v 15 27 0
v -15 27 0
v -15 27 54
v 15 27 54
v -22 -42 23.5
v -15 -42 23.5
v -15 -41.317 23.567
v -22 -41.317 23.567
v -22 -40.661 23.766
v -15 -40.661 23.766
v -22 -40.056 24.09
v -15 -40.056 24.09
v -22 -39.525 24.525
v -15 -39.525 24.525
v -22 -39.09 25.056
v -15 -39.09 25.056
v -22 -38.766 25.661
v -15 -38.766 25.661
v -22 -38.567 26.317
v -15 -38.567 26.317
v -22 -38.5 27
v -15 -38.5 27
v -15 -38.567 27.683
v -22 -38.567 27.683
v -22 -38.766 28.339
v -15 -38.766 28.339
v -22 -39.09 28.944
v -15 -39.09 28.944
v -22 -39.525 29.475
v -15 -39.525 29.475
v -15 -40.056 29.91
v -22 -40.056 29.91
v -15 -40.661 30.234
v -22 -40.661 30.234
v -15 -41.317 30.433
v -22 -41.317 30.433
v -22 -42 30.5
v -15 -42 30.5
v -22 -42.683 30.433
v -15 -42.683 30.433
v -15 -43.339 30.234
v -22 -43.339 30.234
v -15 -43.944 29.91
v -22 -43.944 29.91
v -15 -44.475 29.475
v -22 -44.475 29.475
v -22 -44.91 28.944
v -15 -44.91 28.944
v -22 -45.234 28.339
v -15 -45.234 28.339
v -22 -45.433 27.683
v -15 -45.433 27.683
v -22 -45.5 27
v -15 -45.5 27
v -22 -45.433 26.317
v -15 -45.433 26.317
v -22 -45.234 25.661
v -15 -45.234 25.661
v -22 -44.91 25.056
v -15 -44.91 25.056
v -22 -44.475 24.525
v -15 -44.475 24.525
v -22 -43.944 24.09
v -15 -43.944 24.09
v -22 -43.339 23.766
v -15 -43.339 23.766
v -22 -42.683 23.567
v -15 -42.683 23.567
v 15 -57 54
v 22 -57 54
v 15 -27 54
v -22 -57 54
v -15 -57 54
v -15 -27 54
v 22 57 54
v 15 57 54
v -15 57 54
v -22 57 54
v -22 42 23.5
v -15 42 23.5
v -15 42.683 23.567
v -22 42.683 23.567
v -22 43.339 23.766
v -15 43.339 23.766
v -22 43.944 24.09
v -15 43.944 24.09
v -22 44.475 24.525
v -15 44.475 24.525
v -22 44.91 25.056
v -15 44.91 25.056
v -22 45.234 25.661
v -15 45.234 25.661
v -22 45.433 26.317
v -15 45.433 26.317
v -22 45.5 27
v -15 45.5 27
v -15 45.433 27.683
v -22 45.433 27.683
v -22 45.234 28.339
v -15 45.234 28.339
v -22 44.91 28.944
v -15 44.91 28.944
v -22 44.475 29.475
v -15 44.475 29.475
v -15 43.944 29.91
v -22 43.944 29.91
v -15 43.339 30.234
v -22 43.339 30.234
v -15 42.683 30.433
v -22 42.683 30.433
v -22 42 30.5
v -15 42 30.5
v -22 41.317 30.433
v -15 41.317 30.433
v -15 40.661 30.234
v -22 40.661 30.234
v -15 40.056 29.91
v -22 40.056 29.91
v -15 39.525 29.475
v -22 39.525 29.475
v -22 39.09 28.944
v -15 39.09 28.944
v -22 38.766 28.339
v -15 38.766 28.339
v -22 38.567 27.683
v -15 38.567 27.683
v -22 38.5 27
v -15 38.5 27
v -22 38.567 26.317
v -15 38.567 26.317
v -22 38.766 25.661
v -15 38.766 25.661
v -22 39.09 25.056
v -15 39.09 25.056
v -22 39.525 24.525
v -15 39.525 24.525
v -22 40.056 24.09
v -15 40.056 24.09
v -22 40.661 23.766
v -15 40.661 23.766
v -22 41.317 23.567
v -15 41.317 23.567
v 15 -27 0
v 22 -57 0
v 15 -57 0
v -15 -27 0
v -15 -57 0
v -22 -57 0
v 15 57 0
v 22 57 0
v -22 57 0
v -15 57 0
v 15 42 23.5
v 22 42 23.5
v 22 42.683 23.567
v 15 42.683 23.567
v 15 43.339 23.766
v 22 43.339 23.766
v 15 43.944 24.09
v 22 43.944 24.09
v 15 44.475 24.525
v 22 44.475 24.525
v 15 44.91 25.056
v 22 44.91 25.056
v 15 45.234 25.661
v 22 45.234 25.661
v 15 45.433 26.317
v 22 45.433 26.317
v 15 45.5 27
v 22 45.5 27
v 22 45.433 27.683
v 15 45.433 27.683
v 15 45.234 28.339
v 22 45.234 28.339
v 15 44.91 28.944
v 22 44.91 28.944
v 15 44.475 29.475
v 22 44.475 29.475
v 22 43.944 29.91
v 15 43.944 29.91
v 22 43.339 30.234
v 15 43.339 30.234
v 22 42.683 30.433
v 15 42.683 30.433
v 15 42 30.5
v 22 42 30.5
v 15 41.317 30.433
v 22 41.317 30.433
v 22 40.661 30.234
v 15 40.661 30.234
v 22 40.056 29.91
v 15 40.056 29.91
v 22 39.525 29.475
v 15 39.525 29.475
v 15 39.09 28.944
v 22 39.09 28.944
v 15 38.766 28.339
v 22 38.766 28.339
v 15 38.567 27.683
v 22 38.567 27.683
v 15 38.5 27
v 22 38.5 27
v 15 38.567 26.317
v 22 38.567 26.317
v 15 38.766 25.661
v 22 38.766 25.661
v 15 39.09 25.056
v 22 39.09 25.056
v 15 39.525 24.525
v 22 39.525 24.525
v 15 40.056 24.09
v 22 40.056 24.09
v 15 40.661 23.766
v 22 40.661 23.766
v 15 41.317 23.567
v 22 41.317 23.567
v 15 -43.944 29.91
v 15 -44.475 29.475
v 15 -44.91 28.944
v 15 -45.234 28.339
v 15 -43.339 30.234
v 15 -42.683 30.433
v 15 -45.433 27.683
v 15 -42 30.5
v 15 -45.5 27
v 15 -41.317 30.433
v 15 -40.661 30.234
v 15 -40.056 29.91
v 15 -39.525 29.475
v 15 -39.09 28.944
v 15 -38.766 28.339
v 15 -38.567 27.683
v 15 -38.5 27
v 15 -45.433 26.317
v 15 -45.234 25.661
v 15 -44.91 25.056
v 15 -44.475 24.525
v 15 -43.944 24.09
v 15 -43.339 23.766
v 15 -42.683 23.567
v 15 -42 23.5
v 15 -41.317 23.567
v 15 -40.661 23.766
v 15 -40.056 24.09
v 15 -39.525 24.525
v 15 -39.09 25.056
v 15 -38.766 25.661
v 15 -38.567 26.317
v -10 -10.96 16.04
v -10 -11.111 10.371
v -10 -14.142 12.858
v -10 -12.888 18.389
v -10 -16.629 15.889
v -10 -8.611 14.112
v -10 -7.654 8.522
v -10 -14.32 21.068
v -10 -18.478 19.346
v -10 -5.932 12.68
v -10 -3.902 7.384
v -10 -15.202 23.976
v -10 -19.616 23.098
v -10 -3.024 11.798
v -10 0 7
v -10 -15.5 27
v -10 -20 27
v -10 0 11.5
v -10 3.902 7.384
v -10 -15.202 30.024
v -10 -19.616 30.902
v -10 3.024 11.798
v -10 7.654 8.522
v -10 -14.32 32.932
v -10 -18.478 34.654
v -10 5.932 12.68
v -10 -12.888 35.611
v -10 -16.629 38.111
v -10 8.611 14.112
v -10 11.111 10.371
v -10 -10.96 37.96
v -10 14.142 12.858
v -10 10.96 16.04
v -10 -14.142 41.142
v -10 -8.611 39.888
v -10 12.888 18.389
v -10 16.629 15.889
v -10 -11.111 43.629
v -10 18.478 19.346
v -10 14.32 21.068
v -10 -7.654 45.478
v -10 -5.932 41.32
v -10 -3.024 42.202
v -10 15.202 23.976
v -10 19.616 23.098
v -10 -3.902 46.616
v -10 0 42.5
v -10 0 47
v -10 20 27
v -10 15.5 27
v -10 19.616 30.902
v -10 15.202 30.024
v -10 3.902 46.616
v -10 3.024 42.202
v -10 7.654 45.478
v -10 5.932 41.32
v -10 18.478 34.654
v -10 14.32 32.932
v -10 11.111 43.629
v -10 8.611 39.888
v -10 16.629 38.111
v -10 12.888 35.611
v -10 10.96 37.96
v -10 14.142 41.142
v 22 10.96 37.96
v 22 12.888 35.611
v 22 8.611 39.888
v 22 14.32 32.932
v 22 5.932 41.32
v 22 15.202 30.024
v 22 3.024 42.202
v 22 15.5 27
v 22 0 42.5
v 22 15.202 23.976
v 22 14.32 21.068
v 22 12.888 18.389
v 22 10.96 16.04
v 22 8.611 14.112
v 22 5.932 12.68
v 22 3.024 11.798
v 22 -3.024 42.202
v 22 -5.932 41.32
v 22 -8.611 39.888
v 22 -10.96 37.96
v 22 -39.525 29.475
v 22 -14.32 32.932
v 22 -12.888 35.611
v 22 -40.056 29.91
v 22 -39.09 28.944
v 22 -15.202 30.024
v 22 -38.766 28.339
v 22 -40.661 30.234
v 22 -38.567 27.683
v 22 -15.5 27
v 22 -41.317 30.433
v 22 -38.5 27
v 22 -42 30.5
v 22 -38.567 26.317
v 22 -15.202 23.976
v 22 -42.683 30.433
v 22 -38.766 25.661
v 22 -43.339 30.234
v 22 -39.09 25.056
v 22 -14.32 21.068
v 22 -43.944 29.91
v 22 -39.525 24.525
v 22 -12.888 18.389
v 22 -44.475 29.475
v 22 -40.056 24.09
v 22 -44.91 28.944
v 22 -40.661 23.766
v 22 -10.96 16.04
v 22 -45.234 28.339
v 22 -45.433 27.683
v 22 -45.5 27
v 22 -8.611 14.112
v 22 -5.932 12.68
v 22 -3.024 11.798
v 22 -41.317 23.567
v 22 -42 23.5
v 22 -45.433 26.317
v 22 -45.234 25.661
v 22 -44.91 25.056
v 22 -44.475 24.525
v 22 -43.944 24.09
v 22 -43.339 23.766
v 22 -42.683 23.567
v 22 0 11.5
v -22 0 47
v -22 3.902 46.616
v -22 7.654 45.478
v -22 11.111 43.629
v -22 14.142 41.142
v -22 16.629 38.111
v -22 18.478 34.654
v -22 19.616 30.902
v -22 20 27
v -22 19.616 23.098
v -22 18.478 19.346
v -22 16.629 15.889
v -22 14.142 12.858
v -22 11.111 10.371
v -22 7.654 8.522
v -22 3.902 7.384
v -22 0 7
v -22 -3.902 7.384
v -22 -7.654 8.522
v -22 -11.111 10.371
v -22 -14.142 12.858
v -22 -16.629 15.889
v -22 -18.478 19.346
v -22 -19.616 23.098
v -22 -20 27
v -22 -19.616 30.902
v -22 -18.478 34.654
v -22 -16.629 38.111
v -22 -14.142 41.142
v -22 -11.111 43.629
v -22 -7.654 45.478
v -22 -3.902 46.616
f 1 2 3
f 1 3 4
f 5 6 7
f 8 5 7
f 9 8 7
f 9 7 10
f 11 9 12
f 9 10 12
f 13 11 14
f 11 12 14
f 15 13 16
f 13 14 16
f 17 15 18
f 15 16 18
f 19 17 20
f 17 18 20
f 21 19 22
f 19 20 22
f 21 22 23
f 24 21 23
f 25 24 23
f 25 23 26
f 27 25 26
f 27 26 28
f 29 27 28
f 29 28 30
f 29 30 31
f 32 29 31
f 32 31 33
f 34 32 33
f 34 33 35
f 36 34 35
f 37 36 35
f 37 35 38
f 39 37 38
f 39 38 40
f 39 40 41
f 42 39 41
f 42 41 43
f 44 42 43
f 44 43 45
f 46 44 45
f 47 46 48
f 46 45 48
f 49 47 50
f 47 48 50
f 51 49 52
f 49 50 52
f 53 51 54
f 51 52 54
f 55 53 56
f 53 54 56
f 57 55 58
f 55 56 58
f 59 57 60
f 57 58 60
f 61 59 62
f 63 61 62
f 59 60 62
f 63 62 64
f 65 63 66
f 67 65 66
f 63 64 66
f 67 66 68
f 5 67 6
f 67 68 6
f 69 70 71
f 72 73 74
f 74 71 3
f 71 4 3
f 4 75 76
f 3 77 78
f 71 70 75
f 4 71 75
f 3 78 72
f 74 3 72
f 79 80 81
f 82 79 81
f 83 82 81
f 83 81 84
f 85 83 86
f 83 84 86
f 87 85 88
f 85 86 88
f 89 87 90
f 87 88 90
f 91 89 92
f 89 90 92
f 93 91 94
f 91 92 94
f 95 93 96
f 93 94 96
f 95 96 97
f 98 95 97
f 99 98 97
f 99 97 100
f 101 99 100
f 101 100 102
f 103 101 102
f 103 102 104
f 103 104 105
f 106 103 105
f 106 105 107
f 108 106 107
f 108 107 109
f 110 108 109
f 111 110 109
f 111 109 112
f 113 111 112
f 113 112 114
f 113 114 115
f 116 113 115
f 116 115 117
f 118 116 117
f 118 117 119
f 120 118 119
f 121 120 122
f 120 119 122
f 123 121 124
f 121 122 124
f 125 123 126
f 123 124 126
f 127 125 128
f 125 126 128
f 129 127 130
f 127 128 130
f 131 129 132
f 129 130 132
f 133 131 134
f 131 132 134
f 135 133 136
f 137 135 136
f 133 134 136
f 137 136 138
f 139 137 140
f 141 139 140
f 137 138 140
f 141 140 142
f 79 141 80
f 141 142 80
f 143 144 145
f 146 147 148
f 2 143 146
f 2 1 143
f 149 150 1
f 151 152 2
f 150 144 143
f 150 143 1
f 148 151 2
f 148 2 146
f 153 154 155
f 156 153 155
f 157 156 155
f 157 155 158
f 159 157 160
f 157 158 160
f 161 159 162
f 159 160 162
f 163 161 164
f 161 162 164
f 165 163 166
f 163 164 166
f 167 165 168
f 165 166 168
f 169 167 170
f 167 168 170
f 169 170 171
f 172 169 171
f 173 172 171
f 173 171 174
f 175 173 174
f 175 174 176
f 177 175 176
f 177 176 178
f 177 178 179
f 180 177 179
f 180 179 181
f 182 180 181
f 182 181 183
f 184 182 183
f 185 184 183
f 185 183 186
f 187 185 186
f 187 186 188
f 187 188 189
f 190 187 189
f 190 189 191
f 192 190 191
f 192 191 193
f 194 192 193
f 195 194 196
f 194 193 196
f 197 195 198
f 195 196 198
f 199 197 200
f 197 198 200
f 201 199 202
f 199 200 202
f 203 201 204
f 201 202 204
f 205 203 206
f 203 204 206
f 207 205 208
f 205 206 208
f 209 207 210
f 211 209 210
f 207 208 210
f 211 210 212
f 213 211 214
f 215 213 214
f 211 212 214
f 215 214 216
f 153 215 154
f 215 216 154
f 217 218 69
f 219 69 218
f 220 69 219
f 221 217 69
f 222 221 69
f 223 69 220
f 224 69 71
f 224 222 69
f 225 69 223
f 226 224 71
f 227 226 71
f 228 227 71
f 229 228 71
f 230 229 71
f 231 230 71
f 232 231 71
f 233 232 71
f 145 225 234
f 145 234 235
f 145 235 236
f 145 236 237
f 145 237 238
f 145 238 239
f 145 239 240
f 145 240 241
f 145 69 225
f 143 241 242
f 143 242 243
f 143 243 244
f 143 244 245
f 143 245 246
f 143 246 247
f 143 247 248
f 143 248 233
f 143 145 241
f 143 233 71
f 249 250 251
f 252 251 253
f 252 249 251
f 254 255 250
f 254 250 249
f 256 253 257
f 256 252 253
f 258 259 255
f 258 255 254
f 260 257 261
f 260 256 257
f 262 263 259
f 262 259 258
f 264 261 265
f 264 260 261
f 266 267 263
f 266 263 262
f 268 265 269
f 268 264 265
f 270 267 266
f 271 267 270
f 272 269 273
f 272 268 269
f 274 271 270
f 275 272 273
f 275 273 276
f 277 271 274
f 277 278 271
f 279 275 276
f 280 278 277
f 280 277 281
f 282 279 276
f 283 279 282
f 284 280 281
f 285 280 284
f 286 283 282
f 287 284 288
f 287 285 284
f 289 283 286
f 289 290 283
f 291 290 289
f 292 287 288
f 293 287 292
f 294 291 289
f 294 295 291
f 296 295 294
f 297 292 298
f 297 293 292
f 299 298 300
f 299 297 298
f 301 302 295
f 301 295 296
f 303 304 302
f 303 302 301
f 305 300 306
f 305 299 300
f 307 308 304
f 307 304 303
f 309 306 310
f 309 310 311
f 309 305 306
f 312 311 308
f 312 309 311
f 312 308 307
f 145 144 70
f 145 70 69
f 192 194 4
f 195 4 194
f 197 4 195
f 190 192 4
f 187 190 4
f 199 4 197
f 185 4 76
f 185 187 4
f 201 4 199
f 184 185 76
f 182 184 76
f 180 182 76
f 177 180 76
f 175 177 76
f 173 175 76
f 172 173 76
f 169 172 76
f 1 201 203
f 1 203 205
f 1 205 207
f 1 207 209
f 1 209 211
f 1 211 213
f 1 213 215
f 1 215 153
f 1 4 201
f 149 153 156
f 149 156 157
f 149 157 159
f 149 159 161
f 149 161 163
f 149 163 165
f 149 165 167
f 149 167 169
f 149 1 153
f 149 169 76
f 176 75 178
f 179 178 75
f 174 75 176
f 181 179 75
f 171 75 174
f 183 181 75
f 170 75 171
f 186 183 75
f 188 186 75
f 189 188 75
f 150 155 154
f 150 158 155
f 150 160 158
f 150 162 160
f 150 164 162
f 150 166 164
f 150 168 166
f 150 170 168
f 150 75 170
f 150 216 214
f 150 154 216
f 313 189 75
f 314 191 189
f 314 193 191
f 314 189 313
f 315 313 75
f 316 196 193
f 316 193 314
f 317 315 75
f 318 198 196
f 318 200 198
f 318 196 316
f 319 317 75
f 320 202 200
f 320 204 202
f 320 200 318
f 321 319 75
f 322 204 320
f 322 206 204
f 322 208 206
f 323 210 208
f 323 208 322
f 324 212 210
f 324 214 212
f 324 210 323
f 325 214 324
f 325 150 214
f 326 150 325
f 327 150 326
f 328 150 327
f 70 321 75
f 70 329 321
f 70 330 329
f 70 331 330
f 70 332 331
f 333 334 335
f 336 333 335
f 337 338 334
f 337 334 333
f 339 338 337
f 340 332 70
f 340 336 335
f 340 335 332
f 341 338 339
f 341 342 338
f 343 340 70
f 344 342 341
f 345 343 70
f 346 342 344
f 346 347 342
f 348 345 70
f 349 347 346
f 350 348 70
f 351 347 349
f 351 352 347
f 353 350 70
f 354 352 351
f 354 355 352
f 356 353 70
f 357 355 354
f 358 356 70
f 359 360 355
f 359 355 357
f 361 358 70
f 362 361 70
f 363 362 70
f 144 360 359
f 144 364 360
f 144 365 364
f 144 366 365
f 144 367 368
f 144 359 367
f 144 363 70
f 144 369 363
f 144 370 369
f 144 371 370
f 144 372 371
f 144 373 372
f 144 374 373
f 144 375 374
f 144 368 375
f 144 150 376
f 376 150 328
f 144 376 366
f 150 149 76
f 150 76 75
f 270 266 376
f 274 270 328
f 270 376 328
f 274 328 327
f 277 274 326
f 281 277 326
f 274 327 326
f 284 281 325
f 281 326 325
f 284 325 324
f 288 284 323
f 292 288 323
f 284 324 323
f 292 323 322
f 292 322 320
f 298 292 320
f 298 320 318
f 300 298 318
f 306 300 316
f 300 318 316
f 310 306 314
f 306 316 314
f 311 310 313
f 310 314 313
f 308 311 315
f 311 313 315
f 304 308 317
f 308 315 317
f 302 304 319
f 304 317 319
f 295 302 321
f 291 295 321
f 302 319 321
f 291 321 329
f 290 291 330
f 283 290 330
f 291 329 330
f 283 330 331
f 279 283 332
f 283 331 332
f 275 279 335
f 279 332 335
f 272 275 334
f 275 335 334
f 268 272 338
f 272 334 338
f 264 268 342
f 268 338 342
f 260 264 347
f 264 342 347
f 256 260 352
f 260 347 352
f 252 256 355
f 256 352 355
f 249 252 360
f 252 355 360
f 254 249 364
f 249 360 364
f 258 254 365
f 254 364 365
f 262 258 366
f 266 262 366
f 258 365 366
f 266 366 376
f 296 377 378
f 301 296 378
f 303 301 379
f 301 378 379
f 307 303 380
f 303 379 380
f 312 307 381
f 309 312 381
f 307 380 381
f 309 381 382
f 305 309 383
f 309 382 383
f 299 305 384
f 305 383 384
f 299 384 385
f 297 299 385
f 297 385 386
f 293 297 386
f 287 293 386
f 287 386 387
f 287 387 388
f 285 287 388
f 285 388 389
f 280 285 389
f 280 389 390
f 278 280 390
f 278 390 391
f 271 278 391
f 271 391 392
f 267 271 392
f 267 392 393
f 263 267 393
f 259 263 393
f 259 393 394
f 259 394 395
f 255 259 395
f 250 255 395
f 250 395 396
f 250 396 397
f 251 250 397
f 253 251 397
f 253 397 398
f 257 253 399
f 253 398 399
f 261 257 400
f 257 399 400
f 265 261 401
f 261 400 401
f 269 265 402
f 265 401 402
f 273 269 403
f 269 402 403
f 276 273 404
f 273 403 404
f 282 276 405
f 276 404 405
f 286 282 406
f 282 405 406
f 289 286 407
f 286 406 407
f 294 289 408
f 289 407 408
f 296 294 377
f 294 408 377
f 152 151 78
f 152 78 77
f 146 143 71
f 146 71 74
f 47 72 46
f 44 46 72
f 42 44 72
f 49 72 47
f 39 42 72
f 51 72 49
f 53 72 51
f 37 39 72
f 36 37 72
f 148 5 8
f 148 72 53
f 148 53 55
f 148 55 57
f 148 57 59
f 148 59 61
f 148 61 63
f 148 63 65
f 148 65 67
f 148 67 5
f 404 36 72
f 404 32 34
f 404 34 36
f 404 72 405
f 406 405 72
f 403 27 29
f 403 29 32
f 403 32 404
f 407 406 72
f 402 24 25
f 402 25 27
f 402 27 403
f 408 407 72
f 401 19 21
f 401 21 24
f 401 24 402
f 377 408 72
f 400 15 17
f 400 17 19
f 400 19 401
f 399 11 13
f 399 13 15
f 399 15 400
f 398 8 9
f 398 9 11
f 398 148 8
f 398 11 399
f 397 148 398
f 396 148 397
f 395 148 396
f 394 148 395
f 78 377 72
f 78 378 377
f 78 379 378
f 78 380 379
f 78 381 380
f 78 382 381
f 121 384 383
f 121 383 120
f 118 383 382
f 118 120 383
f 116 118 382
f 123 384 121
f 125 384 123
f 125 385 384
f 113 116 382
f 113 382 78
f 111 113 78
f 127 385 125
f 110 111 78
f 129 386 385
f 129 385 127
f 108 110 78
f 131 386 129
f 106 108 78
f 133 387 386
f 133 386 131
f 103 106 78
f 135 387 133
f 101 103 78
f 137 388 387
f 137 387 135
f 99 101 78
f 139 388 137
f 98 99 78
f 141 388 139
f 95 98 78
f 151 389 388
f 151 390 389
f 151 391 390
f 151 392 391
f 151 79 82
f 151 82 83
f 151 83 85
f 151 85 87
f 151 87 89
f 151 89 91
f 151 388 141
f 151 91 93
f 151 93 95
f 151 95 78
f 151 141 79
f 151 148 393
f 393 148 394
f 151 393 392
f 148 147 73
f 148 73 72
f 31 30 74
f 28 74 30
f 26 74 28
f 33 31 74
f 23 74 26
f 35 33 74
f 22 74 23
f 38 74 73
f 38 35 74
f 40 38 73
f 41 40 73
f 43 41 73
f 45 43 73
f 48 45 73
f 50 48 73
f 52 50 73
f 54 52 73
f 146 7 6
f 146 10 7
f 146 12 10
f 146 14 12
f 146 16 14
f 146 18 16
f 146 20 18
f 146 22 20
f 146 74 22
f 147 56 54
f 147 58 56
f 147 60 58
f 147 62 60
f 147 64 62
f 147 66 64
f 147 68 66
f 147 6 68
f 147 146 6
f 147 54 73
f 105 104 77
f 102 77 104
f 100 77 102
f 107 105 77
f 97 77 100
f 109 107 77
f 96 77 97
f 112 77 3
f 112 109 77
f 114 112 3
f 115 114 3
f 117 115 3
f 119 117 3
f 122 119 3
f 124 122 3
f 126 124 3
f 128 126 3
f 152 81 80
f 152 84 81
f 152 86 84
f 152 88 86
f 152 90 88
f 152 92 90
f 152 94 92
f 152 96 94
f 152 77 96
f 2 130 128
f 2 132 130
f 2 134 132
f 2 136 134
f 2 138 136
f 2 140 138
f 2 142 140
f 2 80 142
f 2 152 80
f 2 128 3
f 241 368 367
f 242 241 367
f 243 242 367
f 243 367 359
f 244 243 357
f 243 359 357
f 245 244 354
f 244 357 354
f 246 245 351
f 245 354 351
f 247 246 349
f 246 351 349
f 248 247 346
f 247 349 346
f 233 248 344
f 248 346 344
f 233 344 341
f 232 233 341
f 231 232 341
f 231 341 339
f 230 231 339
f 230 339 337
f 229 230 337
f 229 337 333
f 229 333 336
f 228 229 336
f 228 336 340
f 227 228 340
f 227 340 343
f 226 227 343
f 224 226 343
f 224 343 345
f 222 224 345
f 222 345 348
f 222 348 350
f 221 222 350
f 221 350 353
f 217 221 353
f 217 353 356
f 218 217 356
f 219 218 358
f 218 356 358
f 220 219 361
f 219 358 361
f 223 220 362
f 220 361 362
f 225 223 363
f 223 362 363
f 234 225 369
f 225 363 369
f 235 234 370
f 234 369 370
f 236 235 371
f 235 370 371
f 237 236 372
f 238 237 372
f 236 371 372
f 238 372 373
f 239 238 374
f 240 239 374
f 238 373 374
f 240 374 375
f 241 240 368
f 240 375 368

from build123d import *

# Parameters (mm, degrees)
BOSS_EXTRUDE1_DEPTH = 53.99999995
HOLE1_D             = 6.99999997
HOLE2_D             = 30.999999976
HOLE2_CBORE_D       = 40.00000001
HOLE2_CBORE_DEPTH   = 11.999999876


with BuildPart() as part:
    # Sketch1 → Boss-Extrude1 (new body)
    with BuildSketch(Plane.XY):
        Polygon((-21.999999942, 56.999999919), (-14.999999972, 56.999999919), (-14.999999972, 26.999999975), (14.999999972, 26.999999975), (14.999999972, 56.999999919), (21.999999942, 56.999999919), (21.999999942, -56.999999919), (14.999999972, -56.999999919), (14.999999972, -26.999999975), (-14.999999972, -26.999999975), (-14.999999972, -56.999999919), (-21.999999942, -56.999999919), align=None)
    extrude(amount=BOSS_EXTRUDE1_DEPTH)

    # Hole1 (through all)
    with Locations(Plane.ZY.offset(21.999999942)):
        with Locations((26.999999975, 41.999999947), (26.999999975, -41.999999947)):
            Hole(HOLE1_D / 2)

    # Hole2 (through all)
    with Locations(Plane.ZY.offset(21.999999942)):
        with Locations((26.999999975, 0)):
            CounterBoreHole(HOLE2_D / 2, HOLE2_CBORE_D / 2, HOLE2_CBORE_DEPTH)


solid = part.part
